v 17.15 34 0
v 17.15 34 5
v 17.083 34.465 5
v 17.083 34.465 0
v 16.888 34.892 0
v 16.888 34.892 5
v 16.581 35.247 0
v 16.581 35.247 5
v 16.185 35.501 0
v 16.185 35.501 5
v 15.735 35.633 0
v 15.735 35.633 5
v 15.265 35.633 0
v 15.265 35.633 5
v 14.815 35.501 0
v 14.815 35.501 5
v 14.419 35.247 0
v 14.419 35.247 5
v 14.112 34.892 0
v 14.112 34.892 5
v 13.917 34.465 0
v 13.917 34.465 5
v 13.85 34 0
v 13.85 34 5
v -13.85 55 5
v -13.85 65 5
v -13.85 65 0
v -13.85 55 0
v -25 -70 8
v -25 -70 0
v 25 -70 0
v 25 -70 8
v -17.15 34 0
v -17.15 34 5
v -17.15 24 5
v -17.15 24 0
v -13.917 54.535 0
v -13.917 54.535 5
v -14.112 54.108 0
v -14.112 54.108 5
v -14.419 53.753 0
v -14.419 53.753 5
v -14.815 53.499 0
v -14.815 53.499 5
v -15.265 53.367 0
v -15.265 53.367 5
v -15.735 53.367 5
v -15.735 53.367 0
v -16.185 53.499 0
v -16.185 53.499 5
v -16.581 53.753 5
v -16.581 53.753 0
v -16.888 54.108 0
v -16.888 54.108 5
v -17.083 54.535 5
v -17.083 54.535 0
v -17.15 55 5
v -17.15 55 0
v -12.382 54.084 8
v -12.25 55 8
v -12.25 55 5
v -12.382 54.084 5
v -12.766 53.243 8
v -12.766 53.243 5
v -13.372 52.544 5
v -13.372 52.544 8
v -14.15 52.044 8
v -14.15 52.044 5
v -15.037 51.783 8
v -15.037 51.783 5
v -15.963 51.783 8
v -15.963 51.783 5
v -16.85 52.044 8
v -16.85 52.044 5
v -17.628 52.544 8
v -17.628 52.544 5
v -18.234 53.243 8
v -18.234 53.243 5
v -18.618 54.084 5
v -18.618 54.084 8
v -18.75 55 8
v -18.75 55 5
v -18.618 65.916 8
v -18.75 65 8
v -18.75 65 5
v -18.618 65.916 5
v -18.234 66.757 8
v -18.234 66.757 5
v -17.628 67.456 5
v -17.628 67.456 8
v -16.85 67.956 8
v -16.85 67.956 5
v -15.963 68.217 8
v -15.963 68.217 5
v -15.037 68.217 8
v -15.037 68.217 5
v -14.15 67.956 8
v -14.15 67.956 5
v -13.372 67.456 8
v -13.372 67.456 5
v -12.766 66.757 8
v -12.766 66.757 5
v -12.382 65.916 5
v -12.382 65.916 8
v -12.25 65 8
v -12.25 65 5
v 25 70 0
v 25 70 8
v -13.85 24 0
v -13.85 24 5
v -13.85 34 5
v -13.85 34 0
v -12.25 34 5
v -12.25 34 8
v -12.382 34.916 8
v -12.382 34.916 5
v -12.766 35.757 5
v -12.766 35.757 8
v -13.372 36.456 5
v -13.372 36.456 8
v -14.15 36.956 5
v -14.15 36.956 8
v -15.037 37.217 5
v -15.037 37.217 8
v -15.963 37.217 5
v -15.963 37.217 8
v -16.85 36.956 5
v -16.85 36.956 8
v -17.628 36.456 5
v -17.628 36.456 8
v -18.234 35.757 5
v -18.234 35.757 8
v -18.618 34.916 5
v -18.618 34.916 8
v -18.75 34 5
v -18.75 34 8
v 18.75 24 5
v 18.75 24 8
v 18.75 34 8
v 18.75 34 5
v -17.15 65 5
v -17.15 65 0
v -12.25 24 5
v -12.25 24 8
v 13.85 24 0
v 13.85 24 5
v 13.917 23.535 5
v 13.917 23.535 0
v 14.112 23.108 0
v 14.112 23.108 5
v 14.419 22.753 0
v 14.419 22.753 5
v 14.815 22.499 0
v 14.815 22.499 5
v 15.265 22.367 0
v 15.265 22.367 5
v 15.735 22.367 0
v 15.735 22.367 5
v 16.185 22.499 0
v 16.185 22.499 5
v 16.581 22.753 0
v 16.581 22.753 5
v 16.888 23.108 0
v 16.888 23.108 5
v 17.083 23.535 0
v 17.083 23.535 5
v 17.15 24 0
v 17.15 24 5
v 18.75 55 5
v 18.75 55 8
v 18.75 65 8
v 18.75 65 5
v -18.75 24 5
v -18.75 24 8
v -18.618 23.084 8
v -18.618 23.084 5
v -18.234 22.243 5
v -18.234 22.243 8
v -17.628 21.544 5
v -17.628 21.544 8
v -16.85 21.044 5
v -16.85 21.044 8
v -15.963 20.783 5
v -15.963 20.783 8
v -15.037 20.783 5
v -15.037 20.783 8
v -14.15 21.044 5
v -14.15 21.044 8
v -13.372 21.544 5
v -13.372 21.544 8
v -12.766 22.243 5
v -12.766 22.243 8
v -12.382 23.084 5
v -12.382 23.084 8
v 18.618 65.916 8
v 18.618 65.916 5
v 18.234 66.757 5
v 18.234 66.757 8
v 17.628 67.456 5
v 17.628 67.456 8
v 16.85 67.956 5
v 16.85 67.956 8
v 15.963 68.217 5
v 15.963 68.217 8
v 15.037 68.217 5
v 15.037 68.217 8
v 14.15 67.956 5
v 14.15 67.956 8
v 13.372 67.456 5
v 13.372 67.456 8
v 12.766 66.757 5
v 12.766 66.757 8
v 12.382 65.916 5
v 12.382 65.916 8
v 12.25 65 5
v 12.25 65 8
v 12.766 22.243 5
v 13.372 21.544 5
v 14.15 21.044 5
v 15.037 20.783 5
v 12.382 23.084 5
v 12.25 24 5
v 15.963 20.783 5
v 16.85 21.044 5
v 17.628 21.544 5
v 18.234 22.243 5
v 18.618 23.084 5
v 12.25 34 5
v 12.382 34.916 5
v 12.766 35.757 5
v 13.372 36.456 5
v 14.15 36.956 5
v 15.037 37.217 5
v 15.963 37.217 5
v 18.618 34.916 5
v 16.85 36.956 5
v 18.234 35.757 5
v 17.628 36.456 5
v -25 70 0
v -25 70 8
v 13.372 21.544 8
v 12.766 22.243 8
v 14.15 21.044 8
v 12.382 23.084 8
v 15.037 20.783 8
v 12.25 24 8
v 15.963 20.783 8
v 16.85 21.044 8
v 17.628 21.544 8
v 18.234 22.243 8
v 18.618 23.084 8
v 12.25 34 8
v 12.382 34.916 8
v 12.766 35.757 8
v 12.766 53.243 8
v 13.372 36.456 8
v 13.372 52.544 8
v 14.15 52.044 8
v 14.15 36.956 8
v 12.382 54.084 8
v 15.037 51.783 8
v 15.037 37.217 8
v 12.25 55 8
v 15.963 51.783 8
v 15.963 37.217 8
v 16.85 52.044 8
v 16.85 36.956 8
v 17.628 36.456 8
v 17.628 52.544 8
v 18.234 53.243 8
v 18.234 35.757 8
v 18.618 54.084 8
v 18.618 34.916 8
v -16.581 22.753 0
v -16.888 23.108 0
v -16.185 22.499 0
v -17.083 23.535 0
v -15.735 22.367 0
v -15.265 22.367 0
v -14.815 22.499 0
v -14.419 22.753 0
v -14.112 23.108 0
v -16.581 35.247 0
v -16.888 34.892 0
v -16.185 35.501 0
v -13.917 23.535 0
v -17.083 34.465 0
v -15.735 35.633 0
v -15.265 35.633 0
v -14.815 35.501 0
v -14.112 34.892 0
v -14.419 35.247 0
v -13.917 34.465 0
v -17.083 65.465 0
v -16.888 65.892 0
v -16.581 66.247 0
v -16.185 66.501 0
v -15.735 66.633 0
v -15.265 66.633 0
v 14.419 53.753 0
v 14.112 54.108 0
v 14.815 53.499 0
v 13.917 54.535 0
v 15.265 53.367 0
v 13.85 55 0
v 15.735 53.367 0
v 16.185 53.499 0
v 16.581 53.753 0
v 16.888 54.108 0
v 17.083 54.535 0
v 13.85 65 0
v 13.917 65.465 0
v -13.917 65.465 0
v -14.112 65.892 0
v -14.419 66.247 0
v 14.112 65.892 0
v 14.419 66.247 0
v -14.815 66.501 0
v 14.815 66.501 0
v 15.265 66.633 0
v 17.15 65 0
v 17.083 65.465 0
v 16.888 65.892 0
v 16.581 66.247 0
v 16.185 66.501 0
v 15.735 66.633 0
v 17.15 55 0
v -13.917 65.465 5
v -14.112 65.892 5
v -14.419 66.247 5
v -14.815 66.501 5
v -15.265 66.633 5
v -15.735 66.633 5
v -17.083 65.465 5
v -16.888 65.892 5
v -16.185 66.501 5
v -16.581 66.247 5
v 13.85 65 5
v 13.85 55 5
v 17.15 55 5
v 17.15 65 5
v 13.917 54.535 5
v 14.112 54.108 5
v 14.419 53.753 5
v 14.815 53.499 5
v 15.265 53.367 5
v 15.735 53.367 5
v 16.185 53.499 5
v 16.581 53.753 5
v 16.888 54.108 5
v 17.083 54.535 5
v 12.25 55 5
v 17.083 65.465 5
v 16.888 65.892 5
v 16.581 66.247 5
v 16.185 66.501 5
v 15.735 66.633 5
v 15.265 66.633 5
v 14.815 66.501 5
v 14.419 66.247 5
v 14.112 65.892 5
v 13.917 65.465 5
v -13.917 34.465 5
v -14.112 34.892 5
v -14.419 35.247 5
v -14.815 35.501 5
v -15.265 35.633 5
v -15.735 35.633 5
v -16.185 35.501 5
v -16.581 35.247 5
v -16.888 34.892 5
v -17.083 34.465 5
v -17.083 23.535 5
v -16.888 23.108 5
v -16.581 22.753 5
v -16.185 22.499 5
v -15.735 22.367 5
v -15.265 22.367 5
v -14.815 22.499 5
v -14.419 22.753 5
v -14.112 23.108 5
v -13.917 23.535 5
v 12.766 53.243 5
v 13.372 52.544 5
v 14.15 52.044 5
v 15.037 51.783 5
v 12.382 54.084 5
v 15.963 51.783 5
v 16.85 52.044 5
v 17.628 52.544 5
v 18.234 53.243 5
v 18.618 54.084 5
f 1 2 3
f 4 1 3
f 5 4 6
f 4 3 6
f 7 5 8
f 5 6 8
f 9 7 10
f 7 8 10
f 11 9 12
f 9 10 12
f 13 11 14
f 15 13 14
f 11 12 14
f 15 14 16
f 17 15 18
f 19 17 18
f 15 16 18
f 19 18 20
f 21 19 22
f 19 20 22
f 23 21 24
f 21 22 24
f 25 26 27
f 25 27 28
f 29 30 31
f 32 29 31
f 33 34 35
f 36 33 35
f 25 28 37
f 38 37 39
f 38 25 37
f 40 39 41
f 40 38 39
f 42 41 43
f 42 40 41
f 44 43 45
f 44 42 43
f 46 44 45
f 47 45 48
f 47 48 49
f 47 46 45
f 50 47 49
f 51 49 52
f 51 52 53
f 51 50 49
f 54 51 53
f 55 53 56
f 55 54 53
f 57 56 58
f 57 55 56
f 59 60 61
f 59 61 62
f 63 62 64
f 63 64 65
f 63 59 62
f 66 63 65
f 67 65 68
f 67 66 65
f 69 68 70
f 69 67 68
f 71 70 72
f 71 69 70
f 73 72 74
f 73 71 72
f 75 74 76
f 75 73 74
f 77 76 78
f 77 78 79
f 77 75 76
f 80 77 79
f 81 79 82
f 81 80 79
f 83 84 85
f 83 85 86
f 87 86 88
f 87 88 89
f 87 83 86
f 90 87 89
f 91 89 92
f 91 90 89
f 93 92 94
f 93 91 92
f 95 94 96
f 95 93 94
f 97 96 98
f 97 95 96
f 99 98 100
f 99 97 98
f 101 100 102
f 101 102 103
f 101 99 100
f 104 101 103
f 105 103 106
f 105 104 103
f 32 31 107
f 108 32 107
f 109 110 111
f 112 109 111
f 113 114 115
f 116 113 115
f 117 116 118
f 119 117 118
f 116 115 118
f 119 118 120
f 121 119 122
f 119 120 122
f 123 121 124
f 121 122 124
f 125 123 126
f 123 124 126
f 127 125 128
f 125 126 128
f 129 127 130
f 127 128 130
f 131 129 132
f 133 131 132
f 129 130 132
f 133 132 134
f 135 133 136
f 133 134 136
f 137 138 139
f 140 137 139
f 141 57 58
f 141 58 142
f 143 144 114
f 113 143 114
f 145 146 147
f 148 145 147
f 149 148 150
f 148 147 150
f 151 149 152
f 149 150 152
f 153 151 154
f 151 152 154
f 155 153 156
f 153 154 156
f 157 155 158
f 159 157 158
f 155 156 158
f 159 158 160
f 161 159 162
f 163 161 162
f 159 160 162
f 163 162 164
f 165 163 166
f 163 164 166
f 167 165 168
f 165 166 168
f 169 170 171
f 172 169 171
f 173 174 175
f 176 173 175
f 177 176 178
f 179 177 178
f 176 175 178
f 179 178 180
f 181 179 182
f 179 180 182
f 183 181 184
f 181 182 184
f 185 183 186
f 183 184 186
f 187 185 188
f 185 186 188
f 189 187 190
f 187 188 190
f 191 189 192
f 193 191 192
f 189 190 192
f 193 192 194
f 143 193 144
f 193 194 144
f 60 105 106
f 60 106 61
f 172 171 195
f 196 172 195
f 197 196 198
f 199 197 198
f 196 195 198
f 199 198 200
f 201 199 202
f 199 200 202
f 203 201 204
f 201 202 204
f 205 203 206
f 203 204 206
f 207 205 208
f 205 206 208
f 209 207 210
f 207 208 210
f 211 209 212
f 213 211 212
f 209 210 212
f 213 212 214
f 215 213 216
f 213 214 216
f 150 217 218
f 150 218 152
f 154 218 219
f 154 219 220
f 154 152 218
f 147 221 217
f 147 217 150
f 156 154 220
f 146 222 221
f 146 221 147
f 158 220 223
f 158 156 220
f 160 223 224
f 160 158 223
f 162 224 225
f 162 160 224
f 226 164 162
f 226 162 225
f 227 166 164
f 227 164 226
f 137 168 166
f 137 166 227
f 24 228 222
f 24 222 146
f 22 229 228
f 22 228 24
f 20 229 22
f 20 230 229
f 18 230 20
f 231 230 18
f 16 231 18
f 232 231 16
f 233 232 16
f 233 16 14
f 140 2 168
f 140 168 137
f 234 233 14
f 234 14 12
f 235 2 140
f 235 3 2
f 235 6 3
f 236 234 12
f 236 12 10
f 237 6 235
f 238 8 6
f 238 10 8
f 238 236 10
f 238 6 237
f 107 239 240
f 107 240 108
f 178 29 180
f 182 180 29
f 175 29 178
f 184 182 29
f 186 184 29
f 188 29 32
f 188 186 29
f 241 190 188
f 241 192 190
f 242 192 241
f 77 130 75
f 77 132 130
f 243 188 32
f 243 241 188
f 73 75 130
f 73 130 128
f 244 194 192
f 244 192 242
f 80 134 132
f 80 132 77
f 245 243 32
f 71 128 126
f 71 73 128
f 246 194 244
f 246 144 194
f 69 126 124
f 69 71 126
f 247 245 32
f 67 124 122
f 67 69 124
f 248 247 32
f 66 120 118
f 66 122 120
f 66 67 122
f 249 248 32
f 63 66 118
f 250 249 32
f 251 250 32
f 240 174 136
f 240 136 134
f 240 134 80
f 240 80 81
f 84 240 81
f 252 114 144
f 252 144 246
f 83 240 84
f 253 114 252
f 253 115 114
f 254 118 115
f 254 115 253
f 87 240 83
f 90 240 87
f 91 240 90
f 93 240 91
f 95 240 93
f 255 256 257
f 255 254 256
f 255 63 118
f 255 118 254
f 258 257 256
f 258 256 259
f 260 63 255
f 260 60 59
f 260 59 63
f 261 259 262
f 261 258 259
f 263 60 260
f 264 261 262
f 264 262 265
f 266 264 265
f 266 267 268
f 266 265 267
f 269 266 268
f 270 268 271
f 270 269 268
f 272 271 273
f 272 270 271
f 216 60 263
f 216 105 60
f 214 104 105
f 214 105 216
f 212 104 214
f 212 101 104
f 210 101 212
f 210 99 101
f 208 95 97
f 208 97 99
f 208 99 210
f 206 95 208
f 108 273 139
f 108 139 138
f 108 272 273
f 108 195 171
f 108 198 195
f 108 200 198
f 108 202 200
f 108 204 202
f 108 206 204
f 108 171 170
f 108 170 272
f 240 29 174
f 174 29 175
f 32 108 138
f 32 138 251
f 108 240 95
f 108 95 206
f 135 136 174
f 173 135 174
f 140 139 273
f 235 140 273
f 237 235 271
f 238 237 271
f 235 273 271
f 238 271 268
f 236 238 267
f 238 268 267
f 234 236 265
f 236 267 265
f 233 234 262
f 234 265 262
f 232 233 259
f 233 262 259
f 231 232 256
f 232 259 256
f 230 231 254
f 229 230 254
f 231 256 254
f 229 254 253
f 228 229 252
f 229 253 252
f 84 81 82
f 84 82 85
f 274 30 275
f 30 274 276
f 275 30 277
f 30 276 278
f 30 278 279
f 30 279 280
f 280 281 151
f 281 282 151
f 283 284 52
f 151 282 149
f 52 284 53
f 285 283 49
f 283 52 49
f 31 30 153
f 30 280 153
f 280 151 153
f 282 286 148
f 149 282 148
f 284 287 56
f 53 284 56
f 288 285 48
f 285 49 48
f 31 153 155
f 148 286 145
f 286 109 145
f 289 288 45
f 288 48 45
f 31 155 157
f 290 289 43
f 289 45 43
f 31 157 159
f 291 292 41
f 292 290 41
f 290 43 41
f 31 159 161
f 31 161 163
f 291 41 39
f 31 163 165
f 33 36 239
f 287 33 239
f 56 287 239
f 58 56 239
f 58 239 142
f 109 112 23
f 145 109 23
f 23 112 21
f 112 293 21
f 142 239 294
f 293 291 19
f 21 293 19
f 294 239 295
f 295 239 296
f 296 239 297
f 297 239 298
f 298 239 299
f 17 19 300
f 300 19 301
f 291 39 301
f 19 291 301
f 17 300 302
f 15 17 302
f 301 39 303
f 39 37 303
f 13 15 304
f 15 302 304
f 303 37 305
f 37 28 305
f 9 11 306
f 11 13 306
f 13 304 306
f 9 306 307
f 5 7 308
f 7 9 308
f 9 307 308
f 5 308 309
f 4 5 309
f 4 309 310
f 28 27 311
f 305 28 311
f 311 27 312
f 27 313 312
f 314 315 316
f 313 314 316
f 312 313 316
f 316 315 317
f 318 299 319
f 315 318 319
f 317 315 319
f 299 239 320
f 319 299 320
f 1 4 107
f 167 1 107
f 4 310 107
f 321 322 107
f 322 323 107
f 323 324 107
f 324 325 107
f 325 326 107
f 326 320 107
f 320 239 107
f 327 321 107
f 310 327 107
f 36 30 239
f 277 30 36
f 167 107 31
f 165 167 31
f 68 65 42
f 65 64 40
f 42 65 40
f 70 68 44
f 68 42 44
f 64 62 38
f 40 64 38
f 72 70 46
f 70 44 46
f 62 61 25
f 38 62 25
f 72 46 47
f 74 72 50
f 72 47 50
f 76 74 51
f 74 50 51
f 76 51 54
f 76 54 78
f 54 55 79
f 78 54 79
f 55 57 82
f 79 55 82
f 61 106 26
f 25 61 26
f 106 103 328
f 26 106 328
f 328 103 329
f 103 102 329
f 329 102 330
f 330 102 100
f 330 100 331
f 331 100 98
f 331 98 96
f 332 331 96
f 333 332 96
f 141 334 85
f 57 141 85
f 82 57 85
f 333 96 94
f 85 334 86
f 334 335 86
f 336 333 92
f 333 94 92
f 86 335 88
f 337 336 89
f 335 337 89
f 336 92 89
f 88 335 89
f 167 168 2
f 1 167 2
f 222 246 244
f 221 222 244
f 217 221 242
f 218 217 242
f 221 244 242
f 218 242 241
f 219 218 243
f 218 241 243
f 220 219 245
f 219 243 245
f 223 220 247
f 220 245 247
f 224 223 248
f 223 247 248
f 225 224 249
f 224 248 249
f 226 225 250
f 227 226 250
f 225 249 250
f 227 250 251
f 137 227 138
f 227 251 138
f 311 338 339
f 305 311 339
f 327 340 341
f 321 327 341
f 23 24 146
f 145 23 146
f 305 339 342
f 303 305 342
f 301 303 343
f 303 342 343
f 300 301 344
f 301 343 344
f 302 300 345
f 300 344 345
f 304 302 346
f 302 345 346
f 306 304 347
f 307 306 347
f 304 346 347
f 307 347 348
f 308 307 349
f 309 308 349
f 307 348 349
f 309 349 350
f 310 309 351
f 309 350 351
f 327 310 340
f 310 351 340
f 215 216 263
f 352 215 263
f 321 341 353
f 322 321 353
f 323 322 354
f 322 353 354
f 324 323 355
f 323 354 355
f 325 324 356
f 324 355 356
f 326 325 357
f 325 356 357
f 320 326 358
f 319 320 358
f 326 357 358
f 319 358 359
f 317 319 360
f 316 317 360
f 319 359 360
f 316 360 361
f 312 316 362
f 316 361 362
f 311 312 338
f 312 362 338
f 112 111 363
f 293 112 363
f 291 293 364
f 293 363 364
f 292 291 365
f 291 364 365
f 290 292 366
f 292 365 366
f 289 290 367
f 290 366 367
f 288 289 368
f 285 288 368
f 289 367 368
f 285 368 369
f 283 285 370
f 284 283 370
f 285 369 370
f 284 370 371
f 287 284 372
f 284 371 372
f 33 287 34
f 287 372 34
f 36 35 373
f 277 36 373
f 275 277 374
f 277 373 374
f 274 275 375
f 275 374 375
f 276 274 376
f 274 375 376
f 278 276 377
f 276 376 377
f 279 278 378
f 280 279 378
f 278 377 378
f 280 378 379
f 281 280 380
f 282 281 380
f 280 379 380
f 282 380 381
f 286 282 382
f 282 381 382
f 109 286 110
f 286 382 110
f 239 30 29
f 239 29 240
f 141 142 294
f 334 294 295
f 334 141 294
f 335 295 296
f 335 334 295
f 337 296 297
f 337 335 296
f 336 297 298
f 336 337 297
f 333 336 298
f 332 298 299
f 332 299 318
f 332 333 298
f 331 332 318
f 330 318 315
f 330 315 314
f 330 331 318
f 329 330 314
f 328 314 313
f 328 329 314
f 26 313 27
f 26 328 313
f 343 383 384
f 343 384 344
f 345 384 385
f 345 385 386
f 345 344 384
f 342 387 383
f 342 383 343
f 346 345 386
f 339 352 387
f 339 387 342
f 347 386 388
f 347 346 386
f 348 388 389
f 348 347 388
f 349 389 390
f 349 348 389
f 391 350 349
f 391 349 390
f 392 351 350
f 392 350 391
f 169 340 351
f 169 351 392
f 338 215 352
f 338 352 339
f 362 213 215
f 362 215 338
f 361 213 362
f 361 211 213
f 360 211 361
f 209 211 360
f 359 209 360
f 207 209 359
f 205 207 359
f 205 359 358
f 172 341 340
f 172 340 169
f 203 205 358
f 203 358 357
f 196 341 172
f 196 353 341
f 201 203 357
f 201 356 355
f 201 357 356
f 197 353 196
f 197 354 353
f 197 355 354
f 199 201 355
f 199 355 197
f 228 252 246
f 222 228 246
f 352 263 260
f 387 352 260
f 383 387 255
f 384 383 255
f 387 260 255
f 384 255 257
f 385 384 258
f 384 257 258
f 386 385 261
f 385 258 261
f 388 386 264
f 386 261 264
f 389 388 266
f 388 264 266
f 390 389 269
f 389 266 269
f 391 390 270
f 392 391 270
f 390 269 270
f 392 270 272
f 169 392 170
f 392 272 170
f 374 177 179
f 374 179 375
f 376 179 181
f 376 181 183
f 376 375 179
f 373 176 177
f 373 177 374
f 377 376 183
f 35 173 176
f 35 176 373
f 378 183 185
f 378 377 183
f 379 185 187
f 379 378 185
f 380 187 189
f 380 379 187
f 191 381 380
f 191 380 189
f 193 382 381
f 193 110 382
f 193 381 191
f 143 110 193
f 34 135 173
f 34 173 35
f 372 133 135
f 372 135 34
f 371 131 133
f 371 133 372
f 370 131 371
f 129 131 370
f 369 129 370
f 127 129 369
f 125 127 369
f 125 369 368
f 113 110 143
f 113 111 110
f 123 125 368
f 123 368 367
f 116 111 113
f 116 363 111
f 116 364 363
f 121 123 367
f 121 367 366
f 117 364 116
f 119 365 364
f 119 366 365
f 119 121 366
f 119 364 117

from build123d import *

# Parameters (mm, degrees)
SKETCH_1_W          = 50
SKETCH_1_H          = 140
EXTRUDE_1_DEPTH     = 8
CUT_EXTRUDE_2_DEPTH = 8
CUT_EXTRUDE_3_DEPTH = 3


with BuildPart() as part:
    # 草圖1 → 填料-伸長1 (new body)
    with BuildSketch(Plane.XY):
        Rectangle(SKETCH_1_W, SKETCH_1_H)
    extrude(amount=EXTRUDE_1_DEPTH)

    # 草圖8 → 除料-伸長2 (cut)
    with BuildSketch(Plane.XY.offset(8)):
        with BuildLine():
            Line((-13.85, 65), (-13.85, 55))
            ThreePointArc((-13.85, 55), (-15.5, 53.35), (-17.15, 55))
            Line((-17.15, 55), (-17.15, 65))
            ThreePointArc((-17.15, 65), (-15.5, 66.65), (-13.85, 65))
        make_face()
        with BuildLine():
            Line((13.85, 65), (13.85, 55))
            ThreePointArc((13.85, 55), (15.5, 53.35), (17.15, 55))
            Line((17.15, 55), (17.15, 65))
            ThreePointArc((17.15, 65), (15.5, 66.65), (13.85, 65))
        make_face()
        with BuildLine():
            Line((13.85, 34), (13.85, 24))
            ThreePointArc((13.85, 24), (15.5, 22.35), (17.15, 24))
            Line((17.15, 24), (17.15, 34))
            ThreePointArc((17.15, 34), (15.5, 35.65), (13.85, 34))
        make_face()
        with BuildLine():
            Line((-17.15, 34), (-17.15, 24))
            ThreePointArc((-17.15, 24), (-15.5, 22.35), (-13.85, 24))
            Line((-13.85, 24), (-13.85, 34))
            ThreePointArc((-13.85, 34), (-15.5, 35.65), (-17.15, 34))
        make_face()
    extrude(amount=-CUT_EXTRUDE_2_DEPTH, mode=Mode.SUBTRACT)

    # 草圖9 → 除料-伸長3 (cut)
    with BuildSketch(Plane.XY.offset(8)):
        with BuildLine():
            Line((-12.25, 65), (-12.25, 55))
            ThreePointArc((-12.25, 55), (-15.5, 51.75), (-18.75, 55))
            Line((-18.75, 55), (-18.75, 65))
            ThreePointArc((-18.75, 65), (-15.5, 68.25), (-12.25, 65))
        make_face()
        with BuildLine():
            Line((12.25, 65), (12.25, 55))
            ThreePointArc((12.25, 55), (15.5, 51.75), (18.75, 55))
            Line((18.75, 55), (18.75, 65))
            ThreePointArc((18.75, 65), (15.5, 68.25), (12.25, 65))
        make_face()
        with BuildLine():
            Line((12.25, 34), (12.25, 24))
            ThreePointArc((12.25, 24), (15.5, 20.75), (18.75, 24))
            Line((18.75, 24), (18.75, 34))
            ThreePointArc((18.75, 34), (15.5, 37.25), (12.25, 34))
        make_face()
        with BuildLine():
            Line((-18.75, 34), (-18.75, 24))
            ThreePointArc((-18.75, 24), (-15.5, 20.75), (-12.25, 24))
            Line((-12.25, 24), (-12.25, 34))
            ThreePointArc((-12.25, 34), (-15.5, 37.25), (-18.75, 34))
        make_face()
    extrude(amount=-CUT_EXTRUDE_3_DEPTH, mode=Mode.SUBTRACT)


solid = part.part
